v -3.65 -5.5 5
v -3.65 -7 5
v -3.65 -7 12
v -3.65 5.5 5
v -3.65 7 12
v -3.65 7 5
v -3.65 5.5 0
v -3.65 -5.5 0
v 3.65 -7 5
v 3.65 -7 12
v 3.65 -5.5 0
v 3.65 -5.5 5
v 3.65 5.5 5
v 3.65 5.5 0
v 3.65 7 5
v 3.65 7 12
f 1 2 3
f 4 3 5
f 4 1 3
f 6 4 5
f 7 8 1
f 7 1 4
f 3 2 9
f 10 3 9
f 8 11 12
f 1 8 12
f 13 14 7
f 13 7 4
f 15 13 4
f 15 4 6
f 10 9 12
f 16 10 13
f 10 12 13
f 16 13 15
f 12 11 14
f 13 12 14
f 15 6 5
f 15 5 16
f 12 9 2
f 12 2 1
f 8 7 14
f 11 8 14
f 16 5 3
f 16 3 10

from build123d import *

# Parameters (mm, degrees)
F0_W     = 7.3
F0_H     = 14
F1_DEPTH = 12
F2_W     = 1.5
F2_H     = 5
F3_DEPTH = 25


with BuildPart() as f1:
    # F0 (on Top) → F1 (new body)
    with BuildSketch(Plane.XY):
        Rectangle(F0_W, F0_H)
    extrude(amount=F1_DEPTH)

    # F2 (on face) → F3 (cut)
    with BuildSketch(Plane.YZ.offset(3.65)):
        with Locations((-6.25, 2.5)):
            Rectangle(F2_W, F2_H)
        with Locations((6.25, 2.5)):
            Rectangle(F2_W, F2_H)
    extrude(amount=-F3_DEPTH, mode=Mode.SUBTRACT)


solid = f1.part
